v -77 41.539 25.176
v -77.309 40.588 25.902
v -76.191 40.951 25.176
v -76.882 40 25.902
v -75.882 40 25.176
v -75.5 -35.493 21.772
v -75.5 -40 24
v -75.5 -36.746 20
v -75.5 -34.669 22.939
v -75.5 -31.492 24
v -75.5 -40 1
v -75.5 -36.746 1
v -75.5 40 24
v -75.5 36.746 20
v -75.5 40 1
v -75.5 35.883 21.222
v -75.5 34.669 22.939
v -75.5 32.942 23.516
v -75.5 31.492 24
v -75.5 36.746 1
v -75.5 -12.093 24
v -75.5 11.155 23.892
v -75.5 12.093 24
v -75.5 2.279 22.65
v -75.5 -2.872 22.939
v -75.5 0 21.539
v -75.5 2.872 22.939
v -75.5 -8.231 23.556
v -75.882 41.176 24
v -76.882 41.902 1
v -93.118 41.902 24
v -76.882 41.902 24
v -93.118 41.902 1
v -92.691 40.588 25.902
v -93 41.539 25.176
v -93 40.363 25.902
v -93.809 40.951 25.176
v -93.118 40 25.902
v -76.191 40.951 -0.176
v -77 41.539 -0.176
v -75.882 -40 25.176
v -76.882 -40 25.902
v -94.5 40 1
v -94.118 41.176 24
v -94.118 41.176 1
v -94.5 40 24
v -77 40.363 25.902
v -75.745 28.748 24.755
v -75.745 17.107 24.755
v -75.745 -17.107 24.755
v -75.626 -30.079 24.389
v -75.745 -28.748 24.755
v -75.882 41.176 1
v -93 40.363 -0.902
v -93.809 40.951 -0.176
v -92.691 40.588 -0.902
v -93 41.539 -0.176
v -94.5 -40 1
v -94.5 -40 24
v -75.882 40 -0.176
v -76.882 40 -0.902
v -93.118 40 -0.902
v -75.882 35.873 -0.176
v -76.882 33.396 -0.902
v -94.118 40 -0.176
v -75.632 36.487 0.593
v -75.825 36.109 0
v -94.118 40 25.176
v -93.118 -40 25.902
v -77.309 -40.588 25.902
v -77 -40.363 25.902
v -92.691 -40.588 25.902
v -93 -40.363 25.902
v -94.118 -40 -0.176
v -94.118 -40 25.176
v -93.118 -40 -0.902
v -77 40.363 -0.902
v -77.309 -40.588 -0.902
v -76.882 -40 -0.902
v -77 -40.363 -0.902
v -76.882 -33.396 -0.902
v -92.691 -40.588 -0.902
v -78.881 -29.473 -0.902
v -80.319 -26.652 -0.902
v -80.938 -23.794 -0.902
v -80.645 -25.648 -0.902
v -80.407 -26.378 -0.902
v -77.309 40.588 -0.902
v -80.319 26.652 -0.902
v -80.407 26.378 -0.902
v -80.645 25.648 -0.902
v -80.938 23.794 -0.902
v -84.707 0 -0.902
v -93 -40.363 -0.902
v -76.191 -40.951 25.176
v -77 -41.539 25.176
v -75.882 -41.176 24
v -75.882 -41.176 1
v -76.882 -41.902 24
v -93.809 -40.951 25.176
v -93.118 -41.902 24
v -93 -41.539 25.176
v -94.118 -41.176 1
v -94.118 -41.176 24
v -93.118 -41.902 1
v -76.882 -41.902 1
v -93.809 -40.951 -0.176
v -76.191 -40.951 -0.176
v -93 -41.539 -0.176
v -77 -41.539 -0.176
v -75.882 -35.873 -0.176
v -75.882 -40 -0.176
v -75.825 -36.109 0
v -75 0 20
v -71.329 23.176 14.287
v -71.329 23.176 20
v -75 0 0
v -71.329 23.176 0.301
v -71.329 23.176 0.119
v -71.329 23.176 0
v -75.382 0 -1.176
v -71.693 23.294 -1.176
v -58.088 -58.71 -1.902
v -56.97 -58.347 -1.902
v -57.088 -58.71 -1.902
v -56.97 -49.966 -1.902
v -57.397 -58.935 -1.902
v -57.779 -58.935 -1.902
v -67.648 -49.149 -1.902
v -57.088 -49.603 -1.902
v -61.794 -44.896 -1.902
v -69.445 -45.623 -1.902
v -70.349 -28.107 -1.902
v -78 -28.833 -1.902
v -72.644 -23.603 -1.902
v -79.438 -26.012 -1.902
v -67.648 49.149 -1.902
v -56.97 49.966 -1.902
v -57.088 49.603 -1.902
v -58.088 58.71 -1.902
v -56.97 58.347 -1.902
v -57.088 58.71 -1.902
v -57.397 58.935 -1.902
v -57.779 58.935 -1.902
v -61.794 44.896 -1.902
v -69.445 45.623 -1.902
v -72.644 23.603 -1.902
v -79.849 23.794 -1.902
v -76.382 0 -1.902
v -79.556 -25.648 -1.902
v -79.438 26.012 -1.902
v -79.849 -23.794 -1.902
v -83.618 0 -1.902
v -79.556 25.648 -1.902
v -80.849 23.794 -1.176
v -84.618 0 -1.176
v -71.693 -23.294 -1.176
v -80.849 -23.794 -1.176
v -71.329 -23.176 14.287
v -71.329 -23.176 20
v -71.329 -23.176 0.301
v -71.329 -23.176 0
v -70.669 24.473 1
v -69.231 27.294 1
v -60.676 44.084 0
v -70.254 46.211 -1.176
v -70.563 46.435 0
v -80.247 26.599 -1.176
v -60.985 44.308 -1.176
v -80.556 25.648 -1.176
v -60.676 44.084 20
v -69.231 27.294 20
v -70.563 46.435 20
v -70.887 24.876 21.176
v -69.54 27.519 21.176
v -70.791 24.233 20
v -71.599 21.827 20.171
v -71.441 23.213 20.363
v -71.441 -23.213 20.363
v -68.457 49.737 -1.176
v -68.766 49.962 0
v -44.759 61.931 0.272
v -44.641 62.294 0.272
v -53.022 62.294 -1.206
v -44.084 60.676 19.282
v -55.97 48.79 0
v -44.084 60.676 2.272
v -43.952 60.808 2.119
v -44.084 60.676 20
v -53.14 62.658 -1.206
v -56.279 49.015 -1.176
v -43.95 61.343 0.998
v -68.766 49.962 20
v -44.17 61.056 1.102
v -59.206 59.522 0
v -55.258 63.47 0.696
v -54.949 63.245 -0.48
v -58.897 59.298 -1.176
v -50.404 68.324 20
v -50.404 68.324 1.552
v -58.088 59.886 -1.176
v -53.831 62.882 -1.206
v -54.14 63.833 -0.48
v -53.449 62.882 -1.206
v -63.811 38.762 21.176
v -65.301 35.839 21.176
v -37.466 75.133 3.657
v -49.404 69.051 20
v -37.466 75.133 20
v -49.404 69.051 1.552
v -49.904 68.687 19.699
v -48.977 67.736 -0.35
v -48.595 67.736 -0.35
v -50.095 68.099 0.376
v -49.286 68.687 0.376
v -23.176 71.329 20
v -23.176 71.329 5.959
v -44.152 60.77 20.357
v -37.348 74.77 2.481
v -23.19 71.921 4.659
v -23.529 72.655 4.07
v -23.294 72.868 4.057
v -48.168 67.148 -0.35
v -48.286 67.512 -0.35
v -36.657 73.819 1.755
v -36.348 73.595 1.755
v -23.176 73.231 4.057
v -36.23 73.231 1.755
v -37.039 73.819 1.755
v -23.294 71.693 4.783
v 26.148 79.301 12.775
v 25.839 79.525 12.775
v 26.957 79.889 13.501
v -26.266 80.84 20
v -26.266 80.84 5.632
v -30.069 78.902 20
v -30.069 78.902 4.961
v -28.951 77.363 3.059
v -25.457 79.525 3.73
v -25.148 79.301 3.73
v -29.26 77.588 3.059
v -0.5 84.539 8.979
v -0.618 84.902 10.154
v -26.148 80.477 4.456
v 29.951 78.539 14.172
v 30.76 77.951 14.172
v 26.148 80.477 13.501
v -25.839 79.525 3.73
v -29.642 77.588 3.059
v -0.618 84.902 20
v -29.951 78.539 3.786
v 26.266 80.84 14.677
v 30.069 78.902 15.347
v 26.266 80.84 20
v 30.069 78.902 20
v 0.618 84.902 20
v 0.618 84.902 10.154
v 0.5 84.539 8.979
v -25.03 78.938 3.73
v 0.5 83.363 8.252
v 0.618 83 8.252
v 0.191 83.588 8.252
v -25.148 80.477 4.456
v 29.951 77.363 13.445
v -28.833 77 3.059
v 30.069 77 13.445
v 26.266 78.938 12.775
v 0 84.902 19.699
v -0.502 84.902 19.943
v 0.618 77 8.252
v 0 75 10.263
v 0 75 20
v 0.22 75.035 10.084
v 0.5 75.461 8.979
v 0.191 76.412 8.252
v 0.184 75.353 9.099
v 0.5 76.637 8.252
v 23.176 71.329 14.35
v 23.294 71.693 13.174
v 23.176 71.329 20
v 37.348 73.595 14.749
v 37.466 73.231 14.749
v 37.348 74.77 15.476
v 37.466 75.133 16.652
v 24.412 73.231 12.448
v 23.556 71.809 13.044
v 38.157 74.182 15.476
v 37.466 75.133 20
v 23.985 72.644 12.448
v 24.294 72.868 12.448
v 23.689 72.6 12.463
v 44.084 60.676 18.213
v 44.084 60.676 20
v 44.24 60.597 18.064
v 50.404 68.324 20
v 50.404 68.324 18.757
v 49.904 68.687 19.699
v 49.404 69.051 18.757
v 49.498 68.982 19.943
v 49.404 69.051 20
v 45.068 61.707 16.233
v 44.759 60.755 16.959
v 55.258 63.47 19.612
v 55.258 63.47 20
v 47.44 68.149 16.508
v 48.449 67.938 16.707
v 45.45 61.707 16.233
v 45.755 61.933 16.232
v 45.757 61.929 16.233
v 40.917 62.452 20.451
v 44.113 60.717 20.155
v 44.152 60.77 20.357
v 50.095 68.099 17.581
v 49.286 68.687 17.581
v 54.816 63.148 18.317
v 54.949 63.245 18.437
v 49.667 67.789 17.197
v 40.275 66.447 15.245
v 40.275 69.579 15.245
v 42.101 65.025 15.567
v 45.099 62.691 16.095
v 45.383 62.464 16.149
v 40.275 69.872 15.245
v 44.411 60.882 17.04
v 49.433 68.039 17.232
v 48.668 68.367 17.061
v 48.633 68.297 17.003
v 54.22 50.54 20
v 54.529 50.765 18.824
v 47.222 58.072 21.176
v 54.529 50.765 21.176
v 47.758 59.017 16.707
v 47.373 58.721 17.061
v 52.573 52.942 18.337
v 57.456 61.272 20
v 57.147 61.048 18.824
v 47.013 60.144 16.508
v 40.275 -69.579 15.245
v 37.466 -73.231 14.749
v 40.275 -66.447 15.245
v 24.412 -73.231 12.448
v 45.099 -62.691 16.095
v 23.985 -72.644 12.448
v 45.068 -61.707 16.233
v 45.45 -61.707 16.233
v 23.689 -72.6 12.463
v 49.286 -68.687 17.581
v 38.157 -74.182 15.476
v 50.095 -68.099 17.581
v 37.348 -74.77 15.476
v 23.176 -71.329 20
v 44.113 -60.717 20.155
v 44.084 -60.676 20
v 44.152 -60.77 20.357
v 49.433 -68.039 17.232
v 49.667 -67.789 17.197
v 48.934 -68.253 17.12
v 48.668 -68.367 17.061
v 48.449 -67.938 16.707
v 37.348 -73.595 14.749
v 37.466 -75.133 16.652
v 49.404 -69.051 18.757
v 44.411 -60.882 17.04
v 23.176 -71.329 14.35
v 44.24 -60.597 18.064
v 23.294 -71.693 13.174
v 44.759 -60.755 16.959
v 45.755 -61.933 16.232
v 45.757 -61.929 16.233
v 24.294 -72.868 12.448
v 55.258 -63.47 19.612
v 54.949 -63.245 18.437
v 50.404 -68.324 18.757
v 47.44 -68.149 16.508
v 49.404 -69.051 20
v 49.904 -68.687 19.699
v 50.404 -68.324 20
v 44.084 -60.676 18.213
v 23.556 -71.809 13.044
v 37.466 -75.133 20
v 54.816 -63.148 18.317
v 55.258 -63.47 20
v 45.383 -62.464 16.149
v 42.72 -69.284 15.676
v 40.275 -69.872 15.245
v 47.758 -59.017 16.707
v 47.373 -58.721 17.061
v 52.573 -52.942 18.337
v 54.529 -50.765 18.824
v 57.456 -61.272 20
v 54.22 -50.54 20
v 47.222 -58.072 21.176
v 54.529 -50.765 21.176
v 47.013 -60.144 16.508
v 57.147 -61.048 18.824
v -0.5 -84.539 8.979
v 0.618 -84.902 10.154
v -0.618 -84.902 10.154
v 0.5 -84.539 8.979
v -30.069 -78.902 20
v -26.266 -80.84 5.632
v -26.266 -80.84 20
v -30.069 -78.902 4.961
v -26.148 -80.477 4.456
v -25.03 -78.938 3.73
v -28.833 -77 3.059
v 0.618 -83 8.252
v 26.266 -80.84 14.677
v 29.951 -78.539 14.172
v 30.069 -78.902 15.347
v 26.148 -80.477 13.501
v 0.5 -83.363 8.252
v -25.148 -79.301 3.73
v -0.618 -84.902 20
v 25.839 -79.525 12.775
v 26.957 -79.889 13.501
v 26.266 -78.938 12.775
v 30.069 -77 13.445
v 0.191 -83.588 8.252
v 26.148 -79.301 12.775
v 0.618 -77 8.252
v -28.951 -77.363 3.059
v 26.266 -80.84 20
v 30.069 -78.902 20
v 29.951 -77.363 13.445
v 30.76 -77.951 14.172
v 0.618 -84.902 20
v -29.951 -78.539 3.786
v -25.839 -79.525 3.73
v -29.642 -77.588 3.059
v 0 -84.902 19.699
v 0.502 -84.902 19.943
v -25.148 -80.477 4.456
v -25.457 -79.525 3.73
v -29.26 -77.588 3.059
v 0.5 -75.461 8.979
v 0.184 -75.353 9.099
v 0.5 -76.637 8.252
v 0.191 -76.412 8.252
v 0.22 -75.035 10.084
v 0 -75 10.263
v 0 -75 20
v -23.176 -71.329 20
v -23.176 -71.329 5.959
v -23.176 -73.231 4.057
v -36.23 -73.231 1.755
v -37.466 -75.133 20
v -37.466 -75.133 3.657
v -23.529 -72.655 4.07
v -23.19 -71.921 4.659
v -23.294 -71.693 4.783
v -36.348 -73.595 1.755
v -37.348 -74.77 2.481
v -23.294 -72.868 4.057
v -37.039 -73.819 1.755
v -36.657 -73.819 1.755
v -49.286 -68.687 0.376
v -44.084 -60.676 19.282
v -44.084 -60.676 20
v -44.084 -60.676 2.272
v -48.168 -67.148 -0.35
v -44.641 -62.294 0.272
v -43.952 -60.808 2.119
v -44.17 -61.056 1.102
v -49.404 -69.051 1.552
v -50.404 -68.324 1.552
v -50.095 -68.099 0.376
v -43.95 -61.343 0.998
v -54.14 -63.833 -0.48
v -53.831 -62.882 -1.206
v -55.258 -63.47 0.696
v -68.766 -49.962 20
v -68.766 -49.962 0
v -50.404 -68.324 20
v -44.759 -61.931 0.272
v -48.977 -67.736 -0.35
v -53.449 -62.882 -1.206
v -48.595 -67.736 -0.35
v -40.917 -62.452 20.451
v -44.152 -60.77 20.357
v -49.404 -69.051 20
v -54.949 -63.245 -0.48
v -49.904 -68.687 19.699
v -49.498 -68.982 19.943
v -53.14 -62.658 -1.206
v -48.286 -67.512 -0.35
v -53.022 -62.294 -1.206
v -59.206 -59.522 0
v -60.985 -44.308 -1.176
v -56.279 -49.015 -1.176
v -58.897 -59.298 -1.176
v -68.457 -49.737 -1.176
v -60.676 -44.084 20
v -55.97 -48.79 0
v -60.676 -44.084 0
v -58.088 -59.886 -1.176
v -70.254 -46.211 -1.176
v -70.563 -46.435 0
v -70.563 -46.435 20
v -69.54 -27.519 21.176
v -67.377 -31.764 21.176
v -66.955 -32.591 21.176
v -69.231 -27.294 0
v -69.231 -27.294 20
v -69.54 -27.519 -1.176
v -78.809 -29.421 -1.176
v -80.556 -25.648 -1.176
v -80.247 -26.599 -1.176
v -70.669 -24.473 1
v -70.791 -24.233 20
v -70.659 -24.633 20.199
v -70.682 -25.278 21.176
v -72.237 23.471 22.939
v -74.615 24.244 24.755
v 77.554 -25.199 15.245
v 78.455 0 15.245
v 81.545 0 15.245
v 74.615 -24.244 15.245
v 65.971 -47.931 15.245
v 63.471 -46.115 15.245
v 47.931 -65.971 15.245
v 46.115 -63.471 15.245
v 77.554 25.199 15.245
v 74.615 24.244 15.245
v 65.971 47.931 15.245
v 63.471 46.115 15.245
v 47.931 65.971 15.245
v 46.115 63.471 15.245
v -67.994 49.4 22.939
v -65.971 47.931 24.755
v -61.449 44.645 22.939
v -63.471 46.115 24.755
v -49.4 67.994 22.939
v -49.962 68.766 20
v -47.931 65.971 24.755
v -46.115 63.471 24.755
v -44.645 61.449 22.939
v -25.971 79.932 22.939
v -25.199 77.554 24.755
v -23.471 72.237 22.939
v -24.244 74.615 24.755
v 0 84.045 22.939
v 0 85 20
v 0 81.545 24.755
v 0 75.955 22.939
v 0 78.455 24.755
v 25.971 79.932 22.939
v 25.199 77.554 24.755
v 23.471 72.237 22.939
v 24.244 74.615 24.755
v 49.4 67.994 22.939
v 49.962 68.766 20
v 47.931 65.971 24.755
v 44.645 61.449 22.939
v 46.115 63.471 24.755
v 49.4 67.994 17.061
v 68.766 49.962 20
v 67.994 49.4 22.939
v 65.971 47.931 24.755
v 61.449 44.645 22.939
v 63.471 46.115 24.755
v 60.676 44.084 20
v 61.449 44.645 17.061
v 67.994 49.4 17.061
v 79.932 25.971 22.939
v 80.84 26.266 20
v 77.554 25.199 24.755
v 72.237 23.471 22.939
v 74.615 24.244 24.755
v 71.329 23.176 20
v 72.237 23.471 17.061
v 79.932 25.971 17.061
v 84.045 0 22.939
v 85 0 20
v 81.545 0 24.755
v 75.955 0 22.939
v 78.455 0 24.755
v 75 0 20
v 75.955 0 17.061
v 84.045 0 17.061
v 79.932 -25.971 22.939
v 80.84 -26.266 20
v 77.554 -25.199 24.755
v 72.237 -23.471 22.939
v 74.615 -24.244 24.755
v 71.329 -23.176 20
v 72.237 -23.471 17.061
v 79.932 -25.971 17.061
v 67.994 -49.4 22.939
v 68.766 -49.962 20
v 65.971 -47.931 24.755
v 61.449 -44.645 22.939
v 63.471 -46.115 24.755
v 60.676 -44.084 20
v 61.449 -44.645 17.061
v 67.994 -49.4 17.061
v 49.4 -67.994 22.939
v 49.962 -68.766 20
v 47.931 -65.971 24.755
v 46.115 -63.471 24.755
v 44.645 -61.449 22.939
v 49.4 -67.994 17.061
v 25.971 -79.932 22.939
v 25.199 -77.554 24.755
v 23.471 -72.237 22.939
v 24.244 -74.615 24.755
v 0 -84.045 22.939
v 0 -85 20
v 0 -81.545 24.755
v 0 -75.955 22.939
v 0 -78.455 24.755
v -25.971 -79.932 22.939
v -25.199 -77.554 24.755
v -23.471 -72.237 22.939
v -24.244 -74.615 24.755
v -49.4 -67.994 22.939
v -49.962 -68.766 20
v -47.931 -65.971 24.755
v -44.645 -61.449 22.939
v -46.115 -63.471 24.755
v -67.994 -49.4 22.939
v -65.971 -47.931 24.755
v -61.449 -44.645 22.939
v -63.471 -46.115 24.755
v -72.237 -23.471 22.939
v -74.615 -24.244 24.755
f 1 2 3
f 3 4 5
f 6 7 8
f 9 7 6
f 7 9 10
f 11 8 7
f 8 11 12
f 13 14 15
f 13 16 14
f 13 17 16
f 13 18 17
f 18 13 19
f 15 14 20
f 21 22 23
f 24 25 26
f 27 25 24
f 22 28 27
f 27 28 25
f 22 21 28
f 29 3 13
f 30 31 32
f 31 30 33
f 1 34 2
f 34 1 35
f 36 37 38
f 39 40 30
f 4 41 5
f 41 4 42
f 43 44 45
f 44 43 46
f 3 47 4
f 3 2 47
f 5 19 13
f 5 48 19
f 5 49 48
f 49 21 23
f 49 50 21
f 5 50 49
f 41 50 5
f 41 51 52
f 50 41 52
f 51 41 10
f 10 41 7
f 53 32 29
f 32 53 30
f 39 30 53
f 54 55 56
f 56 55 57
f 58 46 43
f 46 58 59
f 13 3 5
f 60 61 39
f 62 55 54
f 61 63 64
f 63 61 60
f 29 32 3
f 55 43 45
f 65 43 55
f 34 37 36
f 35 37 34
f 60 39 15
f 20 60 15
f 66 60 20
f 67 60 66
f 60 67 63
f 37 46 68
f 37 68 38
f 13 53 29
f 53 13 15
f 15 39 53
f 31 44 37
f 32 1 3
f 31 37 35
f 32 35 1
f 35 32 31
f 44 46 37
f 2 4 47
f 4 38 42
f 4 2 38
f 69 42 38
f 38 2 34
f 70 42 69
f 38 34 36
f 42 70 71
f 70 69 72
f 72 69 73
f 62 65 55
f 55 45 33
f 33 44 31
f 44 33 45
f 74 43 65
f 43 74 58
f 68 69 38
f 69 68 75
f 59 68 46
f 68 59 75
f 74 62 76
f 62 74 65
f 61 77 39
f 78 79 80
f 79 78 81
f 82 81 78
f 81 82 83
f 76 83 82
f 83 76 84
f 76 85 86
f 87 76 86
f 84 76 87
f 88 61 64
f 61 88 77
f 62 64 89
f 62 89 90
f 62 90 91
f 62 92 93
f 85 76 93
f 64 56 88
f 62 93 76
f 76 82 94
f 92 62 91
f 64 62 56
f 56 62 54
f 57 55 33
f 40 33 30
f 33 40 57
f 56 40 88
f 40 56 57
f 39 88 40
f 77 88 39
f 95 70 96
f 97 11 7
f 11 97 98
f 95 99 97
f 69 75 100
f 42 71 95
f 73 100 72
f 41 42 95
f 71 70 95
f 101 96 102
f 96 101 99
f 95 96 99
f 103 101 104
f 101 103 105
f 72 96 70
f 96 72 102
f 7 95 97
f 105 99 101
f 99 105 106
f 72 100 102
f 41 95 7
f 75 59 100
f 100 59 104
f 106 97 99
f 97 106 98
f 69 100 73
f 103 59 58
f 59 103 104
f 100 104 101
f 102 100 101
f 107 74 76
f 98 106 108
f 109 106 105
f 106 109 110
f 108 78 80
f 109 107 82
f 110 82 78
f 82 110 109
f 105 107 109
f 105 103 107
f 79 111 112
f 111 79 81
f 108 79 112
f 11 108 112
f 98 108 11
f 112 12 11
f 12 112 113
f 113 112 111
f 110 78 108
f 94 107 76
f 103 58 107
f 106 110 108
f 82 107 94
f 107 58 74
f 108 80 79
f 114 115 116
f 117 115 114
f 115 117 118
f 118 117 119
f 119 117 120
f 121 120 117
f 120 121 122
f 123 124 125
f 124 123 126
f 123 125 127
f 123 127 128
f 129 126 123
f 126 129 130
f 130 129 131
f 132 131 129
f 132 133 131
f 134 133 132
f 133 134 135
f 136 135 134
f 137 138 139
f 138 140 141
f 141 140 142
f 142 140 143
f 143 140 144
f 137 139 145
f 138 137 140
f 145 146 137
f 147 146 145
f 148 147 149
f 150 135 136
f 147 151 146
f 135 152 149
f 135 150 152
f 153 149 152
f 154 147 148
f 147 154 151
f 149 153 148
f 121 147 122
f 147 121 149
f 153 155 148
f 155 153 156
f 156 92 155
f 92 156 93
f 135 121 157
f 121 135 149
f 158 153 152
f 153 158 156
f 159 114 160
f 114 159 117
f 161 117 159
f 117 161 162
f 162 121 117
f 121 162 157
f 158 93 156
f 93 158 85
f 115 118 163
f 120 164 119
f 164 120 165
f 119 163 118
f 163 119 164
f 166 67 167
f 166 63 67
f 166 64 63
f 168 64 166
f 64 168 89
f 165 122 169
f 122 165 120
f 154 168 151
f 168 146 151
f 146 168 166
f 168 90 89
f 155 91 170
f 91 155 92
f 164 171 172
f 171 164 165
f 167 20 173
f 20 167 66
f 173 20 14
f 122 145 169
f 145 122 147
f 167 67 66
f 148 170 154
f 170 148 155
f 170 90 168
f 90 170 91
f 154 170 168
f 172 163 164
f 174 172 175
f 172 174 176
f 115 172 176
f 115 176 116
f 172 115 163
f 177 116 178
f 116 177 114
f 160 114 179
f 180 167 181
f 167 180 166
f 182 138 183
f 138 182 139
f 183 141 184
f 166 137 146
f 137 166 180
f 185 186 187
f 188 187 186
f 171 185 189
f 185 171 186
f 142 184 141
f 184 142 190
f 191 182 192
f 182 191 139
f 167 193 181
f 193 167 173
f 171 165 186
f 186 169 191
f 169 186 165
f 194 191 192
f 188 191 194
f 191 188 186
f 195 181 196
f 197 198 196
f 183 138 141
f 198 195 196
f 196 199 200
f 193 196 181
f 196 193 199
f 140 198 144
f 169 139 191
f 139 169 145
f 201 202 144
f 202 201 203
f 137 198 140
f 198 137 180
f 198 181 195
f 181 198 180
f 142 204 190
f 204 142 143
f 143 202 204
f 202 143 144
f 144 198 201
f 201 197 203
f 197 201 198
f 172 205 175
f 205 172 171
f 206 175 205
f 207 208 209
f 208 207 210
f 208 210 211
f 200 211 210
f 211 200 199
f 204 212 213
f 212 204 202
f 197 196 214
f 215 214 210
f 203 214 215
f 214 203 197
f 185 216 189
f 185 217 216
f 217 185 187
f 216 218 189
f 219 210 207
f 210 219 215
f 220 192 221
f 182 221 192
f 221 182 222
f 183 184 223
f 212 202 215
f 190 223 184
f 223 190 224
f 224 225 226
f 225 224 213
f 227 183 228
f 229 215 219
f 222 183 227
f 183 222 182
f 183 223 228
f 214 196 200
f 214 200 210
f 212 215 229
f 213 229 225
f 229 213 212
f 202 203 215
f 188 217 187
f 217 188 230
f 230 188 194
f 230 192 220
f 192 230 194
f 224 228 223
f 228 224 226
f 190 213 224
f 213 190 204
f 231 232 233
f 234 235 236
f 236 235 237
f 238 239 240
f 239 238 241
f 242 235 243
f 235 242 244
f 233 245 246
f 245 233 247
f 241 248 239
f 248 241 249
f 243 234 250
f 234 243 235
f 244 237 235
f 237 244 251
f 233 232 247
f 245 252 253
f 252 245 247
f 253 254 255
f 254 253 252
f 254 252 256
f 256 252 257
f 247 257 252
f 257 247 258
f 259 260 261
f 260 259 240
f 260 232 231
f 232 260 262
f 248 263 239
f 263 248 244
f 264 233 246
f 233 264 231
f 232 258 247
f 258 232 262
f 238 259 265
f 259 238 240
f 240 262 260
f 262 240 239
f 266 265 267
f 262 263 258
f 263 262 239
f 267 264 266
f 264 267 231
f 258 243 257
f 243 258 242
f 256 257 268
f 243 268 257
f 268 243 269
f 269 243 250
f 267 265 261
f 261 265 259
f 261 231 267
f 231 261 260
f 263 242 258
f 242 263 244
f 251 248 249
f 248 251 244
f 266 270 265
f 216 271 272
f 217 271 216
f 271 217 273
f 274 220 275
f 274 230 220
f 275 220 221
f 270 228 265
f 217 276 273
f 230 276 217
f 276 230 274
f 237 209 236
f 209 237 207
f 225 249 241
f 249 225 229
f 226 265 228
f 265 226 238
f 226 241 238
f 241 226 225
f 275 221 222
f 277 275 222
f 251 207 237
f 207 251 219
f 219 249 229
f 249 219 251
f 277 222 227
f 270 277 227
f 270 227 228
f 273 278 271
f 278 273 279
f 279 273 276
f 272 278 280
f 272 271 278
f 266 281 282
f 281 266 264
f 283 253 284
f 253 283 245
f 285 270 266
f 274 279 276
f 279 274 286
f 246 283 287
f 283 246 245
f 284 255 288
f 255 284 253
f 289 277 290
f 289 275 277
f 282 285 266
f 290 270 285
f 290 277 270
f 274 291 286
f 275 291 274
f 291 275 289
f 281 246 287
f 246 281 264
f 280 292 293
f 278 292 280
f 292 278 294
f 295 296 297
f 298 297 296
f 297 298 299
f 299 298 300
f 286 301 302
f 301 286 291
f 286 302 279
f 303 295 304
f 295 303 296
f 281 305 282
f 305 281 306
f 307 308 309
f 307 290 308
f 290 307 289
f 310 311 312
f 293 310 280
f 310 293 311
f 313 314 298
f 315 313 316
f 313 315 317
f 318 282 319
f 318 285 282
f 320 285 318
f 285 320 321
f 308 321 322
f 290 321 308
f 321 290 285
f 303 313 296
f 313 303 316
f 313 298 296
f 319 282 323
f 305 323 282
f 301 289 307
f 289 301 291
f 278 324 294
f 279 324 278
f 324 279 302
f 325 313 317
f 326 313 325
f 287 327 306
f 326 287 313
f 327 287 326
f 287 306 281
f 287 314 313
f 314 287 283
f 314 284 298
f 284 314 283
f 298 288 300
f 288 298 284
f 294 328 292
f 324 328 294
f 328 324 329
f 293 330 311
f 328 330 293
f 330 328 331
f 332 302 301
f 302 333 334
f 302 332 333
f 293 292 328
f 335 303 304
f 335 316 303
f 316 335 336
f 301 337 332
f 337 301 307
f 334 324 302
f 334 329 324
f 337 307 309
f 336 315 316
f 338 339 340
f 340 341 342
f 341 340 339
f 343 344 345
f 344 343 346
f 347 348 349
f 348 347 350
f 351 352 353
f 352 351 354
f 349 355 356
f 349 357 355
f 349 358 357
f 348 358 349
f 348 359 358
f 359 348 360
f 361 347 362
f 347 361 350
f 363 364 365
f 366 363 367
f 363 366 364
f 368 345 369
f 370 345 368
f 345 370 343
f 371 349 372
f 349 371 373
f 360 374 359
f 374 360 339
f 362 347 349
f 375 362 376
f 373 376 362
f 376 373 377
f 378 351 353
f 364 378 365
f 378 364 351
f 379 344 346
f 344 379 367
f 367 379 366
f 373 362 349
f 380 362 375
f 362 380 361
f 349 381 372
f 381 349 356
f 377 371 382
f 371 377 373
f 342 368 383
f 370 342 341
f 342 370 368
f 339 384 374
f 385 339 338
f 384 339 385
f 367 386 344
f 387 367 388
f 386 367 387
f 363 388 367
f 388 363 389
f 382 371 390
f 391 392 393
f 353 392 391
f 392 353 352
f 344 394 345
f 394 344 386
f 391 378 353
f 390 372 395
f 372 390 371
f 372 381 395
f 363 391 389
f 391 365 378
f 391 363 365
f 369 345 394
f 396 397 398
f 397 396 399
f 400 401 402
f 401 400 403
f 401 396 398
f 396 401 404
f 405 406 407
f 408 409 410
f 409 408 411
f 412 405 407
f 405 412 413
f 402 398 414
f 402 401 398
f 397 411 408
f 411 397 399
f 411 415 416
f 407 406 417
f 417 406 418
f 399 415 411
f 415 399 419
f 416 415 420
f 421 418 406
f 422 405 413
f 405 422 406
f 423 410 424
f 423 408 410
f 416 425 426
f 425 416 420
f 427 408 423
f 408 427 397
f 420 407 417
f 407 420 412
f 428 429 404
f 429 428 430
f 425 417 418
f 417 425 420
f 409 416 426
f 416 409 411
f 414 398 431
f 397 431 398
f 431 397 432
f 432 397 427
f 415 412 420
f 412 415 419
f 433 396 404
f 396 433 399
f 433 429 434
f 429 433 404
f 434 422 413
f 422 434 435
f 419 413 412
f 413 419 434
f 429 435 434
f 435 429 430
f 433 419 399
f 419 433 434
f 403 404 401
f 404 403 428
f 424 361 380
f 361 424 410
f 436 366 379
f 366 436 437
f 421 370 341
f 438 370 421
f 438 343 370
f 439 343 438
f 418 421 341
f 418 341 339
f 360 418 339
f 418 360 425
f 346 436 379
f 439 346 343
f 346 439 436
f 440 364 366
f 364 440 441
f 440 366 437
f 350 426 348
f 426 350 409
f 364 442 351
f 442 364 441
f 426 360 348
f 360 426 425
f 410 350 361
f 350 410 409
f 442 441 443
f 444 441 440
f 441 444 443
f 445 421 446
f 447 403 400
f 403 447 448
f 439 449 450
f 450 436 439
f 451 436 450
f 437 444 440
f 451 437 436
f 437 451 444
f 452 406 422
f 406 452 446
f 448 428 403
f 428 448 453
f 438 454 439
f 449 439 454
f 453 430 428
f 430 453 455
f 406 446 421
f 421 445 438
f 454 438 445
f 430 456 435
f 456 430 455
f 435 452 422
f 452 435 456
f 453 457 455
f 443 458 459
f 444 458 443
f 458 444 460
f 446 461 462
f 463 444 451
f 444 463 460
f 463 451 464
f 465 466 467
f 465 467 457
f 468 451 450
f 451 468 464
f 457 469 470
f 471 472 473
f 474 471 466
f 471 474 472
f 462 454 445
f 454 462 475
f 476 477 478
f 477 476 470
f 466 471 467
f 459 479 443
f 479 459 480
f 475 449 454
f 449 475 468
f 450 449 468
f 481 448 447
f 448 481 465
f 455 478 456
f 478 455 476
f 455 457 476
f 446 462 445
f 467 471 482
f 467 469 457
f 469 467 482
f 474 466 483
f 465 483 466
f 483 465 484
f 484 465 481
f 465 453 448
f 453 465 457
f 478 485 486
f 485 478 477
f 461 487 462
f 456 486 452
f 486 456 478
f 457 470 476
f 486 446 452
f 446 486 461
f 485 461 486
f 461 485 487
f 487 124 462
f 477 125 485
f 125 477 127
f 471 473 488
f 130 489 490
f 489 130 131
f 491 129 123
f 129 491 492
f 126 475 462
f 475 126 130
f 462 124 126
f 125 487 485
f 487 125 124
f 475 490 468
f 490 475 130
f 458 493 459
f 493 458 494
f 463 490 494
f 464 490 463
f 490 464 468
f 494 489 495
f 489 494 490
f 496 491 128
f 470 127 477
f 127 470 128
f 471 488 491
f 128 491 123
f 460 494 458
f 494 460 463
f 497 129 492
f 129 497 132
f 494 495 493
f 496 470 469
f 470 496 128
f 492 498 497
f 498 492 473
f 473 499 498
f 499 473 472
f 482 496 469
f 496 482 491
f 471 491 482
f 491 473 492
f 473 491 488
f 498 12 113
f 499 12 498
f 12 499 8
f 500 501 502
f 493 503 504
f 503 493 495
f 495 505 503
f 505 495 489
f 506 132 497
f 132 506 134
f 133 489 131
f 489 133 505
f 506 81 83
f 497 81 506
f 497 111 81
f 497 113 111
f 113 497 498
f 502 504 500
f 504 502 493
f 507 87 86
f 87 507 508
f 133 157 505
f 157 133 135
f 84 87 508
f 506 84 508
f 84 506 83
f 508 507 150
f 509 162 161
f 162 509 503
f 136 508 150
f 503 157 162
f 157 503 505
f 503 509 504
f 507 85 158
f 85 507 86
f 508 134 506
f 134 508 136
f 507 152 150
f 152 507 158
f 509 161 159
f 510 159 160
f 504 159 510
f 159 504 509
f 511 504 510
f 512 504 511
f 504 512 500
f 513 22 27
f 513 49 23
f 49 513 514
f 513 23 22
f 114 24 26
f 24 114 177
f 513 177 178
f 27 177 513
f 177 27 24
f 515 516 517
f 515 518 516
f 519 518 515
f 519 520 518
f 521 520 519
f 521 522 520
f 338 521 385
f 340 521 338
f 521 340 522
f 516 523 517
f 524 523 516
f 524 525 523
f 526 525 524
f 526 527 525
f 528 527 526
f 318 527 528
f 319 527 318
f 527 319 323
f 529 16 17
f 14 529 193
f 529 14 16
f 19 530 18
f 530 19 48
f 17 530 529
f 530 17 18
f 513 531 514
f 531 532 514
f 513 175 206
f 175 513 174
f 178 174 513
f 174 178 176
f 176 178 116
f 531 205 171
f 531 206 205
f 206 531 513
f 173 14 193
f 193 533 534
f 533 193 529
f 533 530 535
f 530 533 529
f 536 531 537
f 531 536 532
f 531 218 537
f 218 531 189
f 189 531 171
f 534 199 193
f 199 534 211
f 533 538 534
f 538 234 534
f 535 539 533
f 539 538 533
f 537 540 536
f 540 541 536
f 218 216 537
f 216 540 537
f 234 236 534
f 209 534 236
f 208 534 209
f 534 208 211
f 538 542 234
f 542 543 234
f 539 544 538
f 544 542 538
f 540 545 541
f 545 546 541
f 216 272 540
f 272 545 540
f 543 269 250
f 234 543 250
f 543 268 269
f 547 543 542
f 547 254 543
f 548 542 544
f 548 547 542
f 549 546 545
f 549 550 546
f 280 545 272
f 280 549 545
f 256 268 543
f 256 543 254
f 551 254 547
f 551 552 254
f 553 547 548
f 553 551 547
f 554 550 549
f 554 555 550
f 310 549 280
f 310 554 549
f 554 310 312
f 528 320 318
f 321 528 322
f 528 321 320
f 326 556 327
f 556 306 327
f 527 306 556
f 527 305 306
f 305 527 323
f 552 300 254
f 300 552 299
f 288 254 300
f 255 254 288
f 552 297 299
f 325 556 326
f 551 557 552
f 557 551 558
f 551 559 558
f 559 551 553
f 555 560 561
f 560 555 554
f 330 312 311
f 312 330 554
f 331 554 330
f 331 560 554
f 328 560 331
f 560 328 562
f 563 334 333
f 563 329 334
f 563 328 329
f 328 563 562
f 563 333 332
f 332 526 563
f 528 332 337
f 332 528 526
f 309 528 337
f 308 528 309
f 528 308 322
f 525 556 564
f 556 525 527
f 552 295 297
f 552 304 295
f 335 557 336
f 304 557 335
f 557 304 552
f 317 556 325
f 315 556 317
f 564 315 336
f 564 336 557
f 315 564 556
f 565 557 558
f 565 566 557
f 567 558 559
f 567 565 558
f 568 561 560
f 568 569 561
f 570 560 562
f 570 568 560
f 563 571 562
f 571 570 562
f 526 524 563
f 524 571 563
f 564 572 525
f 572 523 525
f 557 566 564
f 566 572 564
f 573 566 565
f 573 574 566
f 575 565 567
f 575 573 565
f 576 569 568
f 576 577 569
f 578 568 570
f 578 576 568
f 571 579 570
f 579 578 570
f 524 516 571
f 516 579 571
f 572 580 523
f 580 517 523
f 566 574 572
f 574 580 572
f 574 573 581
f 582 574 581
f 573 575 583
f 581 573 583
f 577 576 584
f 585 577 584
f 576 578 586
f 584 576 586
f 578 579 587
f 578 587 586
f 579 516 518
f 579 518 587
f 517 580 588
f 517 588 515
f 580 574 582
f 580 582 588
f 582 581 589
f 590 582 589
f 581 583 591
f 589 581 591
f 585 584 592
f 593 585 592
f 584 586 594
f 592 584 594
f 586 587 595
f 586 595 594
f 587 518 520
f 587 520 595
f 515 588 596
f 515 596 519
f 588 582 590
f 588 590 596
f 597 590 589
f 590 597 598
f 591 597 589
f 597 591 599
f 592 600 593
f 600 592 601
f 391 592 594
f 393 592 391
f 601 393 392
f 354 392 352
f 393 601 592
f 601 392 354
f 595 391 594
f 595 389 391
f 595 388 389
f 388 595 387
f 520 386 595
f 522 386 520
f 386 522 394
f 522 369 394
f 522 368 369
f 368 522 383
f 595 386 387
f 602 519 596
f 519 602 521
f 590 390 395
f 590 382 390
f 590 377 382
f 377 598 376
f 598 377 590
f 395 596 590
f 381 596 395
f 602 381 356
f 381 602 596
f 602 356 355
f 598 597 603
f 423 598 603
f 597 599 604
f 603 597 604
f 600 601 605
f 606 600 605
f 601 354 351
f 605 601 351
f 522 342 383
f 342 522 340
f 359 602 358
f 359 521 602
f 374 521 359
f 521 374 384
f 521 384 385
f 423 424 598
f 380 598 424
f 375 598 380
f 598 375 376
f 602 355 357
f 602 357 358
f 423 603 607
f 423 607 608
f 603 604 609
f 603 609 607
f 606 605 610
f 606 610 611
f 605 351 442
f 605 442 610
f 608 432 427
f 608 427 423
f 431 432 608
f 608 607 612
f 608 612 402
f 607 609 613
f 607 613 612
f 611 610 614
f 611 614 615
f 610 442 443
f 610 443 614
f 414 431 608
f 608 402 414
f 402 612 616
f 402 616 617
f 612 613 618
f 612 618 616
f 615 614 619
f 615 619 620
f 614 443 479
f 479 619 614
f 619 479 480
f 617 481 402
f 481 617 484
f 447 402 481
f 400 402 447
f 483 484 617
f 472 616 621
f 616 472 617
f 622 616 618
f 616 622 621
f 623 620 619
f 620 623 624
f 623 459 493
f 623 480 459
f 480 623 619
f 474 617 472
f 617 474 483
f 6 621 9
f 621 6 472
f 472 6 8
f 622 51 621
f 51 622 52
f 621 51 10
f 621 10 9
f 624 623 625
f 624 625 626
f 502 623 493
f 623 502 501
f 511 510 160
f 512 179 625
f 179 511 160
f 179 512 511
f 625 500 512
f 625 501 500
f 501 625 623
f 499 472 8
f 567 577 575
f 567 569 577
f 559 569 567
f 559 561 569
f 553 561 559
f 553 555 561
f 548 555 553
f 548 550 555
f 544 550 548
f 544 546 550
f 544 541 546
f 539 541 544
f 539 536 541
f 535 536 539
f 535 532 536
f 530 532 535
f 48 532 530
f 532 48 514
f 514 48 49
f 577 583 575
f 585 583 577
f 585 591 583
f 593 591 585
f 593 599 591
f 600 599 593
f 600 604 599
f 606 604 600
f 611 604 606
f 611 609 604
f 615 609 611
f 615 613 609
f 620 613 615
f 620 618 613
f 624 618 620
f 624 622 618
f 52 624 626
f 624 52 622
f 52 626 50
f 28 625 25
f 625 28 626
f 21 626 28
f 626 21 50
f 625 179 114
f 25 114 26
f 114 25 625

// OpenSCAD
detail = 10;
rayon_sphere = 2;
hauteur = 20;
diametre= 10;
rayon = 80;

module tore(diametre, petit_rayon){
	rotate_extrude(convexity = 10, $fn = 2*detail)
		translate([petit_rayon, 0, 0])
		circle(r = diametre/2, $fn = detail);
	
}

module support_tore(diametre, petit_rayon, hauteur){
	angle = -10;
	minkowski(){
		union(){
		difference(){
		rotate_extrude($fn = 2*detail) translate([petit_rayon+rayon_sphere-diametre/2, 0, 0]) square([diametre-2*rayon_sphere, hauteur]);	
		rotate([0, angle, 0]) translate([0,0, -hauteur/2]) cube([3*petit_rayon, 3*petit_rayon, 2*hauteur], center=true);
					}
		translate([-petit_rayon-diametre/2,0,(hauteur+diametre/2)/2]) cube([3*diametre/2, petit_rayon,hauteur+(diametre/2)-rayon_sphere], center = true);
}
		sphere (rayon_sphere, $fn=detail);
	}
}


translate([0,0,hauteur]) tore(diametre,rayon);
support_tore(diametre, rayon, hauteur);
//-rotate([10, 0, 0]) cube([160, 160, 20], center=true);
